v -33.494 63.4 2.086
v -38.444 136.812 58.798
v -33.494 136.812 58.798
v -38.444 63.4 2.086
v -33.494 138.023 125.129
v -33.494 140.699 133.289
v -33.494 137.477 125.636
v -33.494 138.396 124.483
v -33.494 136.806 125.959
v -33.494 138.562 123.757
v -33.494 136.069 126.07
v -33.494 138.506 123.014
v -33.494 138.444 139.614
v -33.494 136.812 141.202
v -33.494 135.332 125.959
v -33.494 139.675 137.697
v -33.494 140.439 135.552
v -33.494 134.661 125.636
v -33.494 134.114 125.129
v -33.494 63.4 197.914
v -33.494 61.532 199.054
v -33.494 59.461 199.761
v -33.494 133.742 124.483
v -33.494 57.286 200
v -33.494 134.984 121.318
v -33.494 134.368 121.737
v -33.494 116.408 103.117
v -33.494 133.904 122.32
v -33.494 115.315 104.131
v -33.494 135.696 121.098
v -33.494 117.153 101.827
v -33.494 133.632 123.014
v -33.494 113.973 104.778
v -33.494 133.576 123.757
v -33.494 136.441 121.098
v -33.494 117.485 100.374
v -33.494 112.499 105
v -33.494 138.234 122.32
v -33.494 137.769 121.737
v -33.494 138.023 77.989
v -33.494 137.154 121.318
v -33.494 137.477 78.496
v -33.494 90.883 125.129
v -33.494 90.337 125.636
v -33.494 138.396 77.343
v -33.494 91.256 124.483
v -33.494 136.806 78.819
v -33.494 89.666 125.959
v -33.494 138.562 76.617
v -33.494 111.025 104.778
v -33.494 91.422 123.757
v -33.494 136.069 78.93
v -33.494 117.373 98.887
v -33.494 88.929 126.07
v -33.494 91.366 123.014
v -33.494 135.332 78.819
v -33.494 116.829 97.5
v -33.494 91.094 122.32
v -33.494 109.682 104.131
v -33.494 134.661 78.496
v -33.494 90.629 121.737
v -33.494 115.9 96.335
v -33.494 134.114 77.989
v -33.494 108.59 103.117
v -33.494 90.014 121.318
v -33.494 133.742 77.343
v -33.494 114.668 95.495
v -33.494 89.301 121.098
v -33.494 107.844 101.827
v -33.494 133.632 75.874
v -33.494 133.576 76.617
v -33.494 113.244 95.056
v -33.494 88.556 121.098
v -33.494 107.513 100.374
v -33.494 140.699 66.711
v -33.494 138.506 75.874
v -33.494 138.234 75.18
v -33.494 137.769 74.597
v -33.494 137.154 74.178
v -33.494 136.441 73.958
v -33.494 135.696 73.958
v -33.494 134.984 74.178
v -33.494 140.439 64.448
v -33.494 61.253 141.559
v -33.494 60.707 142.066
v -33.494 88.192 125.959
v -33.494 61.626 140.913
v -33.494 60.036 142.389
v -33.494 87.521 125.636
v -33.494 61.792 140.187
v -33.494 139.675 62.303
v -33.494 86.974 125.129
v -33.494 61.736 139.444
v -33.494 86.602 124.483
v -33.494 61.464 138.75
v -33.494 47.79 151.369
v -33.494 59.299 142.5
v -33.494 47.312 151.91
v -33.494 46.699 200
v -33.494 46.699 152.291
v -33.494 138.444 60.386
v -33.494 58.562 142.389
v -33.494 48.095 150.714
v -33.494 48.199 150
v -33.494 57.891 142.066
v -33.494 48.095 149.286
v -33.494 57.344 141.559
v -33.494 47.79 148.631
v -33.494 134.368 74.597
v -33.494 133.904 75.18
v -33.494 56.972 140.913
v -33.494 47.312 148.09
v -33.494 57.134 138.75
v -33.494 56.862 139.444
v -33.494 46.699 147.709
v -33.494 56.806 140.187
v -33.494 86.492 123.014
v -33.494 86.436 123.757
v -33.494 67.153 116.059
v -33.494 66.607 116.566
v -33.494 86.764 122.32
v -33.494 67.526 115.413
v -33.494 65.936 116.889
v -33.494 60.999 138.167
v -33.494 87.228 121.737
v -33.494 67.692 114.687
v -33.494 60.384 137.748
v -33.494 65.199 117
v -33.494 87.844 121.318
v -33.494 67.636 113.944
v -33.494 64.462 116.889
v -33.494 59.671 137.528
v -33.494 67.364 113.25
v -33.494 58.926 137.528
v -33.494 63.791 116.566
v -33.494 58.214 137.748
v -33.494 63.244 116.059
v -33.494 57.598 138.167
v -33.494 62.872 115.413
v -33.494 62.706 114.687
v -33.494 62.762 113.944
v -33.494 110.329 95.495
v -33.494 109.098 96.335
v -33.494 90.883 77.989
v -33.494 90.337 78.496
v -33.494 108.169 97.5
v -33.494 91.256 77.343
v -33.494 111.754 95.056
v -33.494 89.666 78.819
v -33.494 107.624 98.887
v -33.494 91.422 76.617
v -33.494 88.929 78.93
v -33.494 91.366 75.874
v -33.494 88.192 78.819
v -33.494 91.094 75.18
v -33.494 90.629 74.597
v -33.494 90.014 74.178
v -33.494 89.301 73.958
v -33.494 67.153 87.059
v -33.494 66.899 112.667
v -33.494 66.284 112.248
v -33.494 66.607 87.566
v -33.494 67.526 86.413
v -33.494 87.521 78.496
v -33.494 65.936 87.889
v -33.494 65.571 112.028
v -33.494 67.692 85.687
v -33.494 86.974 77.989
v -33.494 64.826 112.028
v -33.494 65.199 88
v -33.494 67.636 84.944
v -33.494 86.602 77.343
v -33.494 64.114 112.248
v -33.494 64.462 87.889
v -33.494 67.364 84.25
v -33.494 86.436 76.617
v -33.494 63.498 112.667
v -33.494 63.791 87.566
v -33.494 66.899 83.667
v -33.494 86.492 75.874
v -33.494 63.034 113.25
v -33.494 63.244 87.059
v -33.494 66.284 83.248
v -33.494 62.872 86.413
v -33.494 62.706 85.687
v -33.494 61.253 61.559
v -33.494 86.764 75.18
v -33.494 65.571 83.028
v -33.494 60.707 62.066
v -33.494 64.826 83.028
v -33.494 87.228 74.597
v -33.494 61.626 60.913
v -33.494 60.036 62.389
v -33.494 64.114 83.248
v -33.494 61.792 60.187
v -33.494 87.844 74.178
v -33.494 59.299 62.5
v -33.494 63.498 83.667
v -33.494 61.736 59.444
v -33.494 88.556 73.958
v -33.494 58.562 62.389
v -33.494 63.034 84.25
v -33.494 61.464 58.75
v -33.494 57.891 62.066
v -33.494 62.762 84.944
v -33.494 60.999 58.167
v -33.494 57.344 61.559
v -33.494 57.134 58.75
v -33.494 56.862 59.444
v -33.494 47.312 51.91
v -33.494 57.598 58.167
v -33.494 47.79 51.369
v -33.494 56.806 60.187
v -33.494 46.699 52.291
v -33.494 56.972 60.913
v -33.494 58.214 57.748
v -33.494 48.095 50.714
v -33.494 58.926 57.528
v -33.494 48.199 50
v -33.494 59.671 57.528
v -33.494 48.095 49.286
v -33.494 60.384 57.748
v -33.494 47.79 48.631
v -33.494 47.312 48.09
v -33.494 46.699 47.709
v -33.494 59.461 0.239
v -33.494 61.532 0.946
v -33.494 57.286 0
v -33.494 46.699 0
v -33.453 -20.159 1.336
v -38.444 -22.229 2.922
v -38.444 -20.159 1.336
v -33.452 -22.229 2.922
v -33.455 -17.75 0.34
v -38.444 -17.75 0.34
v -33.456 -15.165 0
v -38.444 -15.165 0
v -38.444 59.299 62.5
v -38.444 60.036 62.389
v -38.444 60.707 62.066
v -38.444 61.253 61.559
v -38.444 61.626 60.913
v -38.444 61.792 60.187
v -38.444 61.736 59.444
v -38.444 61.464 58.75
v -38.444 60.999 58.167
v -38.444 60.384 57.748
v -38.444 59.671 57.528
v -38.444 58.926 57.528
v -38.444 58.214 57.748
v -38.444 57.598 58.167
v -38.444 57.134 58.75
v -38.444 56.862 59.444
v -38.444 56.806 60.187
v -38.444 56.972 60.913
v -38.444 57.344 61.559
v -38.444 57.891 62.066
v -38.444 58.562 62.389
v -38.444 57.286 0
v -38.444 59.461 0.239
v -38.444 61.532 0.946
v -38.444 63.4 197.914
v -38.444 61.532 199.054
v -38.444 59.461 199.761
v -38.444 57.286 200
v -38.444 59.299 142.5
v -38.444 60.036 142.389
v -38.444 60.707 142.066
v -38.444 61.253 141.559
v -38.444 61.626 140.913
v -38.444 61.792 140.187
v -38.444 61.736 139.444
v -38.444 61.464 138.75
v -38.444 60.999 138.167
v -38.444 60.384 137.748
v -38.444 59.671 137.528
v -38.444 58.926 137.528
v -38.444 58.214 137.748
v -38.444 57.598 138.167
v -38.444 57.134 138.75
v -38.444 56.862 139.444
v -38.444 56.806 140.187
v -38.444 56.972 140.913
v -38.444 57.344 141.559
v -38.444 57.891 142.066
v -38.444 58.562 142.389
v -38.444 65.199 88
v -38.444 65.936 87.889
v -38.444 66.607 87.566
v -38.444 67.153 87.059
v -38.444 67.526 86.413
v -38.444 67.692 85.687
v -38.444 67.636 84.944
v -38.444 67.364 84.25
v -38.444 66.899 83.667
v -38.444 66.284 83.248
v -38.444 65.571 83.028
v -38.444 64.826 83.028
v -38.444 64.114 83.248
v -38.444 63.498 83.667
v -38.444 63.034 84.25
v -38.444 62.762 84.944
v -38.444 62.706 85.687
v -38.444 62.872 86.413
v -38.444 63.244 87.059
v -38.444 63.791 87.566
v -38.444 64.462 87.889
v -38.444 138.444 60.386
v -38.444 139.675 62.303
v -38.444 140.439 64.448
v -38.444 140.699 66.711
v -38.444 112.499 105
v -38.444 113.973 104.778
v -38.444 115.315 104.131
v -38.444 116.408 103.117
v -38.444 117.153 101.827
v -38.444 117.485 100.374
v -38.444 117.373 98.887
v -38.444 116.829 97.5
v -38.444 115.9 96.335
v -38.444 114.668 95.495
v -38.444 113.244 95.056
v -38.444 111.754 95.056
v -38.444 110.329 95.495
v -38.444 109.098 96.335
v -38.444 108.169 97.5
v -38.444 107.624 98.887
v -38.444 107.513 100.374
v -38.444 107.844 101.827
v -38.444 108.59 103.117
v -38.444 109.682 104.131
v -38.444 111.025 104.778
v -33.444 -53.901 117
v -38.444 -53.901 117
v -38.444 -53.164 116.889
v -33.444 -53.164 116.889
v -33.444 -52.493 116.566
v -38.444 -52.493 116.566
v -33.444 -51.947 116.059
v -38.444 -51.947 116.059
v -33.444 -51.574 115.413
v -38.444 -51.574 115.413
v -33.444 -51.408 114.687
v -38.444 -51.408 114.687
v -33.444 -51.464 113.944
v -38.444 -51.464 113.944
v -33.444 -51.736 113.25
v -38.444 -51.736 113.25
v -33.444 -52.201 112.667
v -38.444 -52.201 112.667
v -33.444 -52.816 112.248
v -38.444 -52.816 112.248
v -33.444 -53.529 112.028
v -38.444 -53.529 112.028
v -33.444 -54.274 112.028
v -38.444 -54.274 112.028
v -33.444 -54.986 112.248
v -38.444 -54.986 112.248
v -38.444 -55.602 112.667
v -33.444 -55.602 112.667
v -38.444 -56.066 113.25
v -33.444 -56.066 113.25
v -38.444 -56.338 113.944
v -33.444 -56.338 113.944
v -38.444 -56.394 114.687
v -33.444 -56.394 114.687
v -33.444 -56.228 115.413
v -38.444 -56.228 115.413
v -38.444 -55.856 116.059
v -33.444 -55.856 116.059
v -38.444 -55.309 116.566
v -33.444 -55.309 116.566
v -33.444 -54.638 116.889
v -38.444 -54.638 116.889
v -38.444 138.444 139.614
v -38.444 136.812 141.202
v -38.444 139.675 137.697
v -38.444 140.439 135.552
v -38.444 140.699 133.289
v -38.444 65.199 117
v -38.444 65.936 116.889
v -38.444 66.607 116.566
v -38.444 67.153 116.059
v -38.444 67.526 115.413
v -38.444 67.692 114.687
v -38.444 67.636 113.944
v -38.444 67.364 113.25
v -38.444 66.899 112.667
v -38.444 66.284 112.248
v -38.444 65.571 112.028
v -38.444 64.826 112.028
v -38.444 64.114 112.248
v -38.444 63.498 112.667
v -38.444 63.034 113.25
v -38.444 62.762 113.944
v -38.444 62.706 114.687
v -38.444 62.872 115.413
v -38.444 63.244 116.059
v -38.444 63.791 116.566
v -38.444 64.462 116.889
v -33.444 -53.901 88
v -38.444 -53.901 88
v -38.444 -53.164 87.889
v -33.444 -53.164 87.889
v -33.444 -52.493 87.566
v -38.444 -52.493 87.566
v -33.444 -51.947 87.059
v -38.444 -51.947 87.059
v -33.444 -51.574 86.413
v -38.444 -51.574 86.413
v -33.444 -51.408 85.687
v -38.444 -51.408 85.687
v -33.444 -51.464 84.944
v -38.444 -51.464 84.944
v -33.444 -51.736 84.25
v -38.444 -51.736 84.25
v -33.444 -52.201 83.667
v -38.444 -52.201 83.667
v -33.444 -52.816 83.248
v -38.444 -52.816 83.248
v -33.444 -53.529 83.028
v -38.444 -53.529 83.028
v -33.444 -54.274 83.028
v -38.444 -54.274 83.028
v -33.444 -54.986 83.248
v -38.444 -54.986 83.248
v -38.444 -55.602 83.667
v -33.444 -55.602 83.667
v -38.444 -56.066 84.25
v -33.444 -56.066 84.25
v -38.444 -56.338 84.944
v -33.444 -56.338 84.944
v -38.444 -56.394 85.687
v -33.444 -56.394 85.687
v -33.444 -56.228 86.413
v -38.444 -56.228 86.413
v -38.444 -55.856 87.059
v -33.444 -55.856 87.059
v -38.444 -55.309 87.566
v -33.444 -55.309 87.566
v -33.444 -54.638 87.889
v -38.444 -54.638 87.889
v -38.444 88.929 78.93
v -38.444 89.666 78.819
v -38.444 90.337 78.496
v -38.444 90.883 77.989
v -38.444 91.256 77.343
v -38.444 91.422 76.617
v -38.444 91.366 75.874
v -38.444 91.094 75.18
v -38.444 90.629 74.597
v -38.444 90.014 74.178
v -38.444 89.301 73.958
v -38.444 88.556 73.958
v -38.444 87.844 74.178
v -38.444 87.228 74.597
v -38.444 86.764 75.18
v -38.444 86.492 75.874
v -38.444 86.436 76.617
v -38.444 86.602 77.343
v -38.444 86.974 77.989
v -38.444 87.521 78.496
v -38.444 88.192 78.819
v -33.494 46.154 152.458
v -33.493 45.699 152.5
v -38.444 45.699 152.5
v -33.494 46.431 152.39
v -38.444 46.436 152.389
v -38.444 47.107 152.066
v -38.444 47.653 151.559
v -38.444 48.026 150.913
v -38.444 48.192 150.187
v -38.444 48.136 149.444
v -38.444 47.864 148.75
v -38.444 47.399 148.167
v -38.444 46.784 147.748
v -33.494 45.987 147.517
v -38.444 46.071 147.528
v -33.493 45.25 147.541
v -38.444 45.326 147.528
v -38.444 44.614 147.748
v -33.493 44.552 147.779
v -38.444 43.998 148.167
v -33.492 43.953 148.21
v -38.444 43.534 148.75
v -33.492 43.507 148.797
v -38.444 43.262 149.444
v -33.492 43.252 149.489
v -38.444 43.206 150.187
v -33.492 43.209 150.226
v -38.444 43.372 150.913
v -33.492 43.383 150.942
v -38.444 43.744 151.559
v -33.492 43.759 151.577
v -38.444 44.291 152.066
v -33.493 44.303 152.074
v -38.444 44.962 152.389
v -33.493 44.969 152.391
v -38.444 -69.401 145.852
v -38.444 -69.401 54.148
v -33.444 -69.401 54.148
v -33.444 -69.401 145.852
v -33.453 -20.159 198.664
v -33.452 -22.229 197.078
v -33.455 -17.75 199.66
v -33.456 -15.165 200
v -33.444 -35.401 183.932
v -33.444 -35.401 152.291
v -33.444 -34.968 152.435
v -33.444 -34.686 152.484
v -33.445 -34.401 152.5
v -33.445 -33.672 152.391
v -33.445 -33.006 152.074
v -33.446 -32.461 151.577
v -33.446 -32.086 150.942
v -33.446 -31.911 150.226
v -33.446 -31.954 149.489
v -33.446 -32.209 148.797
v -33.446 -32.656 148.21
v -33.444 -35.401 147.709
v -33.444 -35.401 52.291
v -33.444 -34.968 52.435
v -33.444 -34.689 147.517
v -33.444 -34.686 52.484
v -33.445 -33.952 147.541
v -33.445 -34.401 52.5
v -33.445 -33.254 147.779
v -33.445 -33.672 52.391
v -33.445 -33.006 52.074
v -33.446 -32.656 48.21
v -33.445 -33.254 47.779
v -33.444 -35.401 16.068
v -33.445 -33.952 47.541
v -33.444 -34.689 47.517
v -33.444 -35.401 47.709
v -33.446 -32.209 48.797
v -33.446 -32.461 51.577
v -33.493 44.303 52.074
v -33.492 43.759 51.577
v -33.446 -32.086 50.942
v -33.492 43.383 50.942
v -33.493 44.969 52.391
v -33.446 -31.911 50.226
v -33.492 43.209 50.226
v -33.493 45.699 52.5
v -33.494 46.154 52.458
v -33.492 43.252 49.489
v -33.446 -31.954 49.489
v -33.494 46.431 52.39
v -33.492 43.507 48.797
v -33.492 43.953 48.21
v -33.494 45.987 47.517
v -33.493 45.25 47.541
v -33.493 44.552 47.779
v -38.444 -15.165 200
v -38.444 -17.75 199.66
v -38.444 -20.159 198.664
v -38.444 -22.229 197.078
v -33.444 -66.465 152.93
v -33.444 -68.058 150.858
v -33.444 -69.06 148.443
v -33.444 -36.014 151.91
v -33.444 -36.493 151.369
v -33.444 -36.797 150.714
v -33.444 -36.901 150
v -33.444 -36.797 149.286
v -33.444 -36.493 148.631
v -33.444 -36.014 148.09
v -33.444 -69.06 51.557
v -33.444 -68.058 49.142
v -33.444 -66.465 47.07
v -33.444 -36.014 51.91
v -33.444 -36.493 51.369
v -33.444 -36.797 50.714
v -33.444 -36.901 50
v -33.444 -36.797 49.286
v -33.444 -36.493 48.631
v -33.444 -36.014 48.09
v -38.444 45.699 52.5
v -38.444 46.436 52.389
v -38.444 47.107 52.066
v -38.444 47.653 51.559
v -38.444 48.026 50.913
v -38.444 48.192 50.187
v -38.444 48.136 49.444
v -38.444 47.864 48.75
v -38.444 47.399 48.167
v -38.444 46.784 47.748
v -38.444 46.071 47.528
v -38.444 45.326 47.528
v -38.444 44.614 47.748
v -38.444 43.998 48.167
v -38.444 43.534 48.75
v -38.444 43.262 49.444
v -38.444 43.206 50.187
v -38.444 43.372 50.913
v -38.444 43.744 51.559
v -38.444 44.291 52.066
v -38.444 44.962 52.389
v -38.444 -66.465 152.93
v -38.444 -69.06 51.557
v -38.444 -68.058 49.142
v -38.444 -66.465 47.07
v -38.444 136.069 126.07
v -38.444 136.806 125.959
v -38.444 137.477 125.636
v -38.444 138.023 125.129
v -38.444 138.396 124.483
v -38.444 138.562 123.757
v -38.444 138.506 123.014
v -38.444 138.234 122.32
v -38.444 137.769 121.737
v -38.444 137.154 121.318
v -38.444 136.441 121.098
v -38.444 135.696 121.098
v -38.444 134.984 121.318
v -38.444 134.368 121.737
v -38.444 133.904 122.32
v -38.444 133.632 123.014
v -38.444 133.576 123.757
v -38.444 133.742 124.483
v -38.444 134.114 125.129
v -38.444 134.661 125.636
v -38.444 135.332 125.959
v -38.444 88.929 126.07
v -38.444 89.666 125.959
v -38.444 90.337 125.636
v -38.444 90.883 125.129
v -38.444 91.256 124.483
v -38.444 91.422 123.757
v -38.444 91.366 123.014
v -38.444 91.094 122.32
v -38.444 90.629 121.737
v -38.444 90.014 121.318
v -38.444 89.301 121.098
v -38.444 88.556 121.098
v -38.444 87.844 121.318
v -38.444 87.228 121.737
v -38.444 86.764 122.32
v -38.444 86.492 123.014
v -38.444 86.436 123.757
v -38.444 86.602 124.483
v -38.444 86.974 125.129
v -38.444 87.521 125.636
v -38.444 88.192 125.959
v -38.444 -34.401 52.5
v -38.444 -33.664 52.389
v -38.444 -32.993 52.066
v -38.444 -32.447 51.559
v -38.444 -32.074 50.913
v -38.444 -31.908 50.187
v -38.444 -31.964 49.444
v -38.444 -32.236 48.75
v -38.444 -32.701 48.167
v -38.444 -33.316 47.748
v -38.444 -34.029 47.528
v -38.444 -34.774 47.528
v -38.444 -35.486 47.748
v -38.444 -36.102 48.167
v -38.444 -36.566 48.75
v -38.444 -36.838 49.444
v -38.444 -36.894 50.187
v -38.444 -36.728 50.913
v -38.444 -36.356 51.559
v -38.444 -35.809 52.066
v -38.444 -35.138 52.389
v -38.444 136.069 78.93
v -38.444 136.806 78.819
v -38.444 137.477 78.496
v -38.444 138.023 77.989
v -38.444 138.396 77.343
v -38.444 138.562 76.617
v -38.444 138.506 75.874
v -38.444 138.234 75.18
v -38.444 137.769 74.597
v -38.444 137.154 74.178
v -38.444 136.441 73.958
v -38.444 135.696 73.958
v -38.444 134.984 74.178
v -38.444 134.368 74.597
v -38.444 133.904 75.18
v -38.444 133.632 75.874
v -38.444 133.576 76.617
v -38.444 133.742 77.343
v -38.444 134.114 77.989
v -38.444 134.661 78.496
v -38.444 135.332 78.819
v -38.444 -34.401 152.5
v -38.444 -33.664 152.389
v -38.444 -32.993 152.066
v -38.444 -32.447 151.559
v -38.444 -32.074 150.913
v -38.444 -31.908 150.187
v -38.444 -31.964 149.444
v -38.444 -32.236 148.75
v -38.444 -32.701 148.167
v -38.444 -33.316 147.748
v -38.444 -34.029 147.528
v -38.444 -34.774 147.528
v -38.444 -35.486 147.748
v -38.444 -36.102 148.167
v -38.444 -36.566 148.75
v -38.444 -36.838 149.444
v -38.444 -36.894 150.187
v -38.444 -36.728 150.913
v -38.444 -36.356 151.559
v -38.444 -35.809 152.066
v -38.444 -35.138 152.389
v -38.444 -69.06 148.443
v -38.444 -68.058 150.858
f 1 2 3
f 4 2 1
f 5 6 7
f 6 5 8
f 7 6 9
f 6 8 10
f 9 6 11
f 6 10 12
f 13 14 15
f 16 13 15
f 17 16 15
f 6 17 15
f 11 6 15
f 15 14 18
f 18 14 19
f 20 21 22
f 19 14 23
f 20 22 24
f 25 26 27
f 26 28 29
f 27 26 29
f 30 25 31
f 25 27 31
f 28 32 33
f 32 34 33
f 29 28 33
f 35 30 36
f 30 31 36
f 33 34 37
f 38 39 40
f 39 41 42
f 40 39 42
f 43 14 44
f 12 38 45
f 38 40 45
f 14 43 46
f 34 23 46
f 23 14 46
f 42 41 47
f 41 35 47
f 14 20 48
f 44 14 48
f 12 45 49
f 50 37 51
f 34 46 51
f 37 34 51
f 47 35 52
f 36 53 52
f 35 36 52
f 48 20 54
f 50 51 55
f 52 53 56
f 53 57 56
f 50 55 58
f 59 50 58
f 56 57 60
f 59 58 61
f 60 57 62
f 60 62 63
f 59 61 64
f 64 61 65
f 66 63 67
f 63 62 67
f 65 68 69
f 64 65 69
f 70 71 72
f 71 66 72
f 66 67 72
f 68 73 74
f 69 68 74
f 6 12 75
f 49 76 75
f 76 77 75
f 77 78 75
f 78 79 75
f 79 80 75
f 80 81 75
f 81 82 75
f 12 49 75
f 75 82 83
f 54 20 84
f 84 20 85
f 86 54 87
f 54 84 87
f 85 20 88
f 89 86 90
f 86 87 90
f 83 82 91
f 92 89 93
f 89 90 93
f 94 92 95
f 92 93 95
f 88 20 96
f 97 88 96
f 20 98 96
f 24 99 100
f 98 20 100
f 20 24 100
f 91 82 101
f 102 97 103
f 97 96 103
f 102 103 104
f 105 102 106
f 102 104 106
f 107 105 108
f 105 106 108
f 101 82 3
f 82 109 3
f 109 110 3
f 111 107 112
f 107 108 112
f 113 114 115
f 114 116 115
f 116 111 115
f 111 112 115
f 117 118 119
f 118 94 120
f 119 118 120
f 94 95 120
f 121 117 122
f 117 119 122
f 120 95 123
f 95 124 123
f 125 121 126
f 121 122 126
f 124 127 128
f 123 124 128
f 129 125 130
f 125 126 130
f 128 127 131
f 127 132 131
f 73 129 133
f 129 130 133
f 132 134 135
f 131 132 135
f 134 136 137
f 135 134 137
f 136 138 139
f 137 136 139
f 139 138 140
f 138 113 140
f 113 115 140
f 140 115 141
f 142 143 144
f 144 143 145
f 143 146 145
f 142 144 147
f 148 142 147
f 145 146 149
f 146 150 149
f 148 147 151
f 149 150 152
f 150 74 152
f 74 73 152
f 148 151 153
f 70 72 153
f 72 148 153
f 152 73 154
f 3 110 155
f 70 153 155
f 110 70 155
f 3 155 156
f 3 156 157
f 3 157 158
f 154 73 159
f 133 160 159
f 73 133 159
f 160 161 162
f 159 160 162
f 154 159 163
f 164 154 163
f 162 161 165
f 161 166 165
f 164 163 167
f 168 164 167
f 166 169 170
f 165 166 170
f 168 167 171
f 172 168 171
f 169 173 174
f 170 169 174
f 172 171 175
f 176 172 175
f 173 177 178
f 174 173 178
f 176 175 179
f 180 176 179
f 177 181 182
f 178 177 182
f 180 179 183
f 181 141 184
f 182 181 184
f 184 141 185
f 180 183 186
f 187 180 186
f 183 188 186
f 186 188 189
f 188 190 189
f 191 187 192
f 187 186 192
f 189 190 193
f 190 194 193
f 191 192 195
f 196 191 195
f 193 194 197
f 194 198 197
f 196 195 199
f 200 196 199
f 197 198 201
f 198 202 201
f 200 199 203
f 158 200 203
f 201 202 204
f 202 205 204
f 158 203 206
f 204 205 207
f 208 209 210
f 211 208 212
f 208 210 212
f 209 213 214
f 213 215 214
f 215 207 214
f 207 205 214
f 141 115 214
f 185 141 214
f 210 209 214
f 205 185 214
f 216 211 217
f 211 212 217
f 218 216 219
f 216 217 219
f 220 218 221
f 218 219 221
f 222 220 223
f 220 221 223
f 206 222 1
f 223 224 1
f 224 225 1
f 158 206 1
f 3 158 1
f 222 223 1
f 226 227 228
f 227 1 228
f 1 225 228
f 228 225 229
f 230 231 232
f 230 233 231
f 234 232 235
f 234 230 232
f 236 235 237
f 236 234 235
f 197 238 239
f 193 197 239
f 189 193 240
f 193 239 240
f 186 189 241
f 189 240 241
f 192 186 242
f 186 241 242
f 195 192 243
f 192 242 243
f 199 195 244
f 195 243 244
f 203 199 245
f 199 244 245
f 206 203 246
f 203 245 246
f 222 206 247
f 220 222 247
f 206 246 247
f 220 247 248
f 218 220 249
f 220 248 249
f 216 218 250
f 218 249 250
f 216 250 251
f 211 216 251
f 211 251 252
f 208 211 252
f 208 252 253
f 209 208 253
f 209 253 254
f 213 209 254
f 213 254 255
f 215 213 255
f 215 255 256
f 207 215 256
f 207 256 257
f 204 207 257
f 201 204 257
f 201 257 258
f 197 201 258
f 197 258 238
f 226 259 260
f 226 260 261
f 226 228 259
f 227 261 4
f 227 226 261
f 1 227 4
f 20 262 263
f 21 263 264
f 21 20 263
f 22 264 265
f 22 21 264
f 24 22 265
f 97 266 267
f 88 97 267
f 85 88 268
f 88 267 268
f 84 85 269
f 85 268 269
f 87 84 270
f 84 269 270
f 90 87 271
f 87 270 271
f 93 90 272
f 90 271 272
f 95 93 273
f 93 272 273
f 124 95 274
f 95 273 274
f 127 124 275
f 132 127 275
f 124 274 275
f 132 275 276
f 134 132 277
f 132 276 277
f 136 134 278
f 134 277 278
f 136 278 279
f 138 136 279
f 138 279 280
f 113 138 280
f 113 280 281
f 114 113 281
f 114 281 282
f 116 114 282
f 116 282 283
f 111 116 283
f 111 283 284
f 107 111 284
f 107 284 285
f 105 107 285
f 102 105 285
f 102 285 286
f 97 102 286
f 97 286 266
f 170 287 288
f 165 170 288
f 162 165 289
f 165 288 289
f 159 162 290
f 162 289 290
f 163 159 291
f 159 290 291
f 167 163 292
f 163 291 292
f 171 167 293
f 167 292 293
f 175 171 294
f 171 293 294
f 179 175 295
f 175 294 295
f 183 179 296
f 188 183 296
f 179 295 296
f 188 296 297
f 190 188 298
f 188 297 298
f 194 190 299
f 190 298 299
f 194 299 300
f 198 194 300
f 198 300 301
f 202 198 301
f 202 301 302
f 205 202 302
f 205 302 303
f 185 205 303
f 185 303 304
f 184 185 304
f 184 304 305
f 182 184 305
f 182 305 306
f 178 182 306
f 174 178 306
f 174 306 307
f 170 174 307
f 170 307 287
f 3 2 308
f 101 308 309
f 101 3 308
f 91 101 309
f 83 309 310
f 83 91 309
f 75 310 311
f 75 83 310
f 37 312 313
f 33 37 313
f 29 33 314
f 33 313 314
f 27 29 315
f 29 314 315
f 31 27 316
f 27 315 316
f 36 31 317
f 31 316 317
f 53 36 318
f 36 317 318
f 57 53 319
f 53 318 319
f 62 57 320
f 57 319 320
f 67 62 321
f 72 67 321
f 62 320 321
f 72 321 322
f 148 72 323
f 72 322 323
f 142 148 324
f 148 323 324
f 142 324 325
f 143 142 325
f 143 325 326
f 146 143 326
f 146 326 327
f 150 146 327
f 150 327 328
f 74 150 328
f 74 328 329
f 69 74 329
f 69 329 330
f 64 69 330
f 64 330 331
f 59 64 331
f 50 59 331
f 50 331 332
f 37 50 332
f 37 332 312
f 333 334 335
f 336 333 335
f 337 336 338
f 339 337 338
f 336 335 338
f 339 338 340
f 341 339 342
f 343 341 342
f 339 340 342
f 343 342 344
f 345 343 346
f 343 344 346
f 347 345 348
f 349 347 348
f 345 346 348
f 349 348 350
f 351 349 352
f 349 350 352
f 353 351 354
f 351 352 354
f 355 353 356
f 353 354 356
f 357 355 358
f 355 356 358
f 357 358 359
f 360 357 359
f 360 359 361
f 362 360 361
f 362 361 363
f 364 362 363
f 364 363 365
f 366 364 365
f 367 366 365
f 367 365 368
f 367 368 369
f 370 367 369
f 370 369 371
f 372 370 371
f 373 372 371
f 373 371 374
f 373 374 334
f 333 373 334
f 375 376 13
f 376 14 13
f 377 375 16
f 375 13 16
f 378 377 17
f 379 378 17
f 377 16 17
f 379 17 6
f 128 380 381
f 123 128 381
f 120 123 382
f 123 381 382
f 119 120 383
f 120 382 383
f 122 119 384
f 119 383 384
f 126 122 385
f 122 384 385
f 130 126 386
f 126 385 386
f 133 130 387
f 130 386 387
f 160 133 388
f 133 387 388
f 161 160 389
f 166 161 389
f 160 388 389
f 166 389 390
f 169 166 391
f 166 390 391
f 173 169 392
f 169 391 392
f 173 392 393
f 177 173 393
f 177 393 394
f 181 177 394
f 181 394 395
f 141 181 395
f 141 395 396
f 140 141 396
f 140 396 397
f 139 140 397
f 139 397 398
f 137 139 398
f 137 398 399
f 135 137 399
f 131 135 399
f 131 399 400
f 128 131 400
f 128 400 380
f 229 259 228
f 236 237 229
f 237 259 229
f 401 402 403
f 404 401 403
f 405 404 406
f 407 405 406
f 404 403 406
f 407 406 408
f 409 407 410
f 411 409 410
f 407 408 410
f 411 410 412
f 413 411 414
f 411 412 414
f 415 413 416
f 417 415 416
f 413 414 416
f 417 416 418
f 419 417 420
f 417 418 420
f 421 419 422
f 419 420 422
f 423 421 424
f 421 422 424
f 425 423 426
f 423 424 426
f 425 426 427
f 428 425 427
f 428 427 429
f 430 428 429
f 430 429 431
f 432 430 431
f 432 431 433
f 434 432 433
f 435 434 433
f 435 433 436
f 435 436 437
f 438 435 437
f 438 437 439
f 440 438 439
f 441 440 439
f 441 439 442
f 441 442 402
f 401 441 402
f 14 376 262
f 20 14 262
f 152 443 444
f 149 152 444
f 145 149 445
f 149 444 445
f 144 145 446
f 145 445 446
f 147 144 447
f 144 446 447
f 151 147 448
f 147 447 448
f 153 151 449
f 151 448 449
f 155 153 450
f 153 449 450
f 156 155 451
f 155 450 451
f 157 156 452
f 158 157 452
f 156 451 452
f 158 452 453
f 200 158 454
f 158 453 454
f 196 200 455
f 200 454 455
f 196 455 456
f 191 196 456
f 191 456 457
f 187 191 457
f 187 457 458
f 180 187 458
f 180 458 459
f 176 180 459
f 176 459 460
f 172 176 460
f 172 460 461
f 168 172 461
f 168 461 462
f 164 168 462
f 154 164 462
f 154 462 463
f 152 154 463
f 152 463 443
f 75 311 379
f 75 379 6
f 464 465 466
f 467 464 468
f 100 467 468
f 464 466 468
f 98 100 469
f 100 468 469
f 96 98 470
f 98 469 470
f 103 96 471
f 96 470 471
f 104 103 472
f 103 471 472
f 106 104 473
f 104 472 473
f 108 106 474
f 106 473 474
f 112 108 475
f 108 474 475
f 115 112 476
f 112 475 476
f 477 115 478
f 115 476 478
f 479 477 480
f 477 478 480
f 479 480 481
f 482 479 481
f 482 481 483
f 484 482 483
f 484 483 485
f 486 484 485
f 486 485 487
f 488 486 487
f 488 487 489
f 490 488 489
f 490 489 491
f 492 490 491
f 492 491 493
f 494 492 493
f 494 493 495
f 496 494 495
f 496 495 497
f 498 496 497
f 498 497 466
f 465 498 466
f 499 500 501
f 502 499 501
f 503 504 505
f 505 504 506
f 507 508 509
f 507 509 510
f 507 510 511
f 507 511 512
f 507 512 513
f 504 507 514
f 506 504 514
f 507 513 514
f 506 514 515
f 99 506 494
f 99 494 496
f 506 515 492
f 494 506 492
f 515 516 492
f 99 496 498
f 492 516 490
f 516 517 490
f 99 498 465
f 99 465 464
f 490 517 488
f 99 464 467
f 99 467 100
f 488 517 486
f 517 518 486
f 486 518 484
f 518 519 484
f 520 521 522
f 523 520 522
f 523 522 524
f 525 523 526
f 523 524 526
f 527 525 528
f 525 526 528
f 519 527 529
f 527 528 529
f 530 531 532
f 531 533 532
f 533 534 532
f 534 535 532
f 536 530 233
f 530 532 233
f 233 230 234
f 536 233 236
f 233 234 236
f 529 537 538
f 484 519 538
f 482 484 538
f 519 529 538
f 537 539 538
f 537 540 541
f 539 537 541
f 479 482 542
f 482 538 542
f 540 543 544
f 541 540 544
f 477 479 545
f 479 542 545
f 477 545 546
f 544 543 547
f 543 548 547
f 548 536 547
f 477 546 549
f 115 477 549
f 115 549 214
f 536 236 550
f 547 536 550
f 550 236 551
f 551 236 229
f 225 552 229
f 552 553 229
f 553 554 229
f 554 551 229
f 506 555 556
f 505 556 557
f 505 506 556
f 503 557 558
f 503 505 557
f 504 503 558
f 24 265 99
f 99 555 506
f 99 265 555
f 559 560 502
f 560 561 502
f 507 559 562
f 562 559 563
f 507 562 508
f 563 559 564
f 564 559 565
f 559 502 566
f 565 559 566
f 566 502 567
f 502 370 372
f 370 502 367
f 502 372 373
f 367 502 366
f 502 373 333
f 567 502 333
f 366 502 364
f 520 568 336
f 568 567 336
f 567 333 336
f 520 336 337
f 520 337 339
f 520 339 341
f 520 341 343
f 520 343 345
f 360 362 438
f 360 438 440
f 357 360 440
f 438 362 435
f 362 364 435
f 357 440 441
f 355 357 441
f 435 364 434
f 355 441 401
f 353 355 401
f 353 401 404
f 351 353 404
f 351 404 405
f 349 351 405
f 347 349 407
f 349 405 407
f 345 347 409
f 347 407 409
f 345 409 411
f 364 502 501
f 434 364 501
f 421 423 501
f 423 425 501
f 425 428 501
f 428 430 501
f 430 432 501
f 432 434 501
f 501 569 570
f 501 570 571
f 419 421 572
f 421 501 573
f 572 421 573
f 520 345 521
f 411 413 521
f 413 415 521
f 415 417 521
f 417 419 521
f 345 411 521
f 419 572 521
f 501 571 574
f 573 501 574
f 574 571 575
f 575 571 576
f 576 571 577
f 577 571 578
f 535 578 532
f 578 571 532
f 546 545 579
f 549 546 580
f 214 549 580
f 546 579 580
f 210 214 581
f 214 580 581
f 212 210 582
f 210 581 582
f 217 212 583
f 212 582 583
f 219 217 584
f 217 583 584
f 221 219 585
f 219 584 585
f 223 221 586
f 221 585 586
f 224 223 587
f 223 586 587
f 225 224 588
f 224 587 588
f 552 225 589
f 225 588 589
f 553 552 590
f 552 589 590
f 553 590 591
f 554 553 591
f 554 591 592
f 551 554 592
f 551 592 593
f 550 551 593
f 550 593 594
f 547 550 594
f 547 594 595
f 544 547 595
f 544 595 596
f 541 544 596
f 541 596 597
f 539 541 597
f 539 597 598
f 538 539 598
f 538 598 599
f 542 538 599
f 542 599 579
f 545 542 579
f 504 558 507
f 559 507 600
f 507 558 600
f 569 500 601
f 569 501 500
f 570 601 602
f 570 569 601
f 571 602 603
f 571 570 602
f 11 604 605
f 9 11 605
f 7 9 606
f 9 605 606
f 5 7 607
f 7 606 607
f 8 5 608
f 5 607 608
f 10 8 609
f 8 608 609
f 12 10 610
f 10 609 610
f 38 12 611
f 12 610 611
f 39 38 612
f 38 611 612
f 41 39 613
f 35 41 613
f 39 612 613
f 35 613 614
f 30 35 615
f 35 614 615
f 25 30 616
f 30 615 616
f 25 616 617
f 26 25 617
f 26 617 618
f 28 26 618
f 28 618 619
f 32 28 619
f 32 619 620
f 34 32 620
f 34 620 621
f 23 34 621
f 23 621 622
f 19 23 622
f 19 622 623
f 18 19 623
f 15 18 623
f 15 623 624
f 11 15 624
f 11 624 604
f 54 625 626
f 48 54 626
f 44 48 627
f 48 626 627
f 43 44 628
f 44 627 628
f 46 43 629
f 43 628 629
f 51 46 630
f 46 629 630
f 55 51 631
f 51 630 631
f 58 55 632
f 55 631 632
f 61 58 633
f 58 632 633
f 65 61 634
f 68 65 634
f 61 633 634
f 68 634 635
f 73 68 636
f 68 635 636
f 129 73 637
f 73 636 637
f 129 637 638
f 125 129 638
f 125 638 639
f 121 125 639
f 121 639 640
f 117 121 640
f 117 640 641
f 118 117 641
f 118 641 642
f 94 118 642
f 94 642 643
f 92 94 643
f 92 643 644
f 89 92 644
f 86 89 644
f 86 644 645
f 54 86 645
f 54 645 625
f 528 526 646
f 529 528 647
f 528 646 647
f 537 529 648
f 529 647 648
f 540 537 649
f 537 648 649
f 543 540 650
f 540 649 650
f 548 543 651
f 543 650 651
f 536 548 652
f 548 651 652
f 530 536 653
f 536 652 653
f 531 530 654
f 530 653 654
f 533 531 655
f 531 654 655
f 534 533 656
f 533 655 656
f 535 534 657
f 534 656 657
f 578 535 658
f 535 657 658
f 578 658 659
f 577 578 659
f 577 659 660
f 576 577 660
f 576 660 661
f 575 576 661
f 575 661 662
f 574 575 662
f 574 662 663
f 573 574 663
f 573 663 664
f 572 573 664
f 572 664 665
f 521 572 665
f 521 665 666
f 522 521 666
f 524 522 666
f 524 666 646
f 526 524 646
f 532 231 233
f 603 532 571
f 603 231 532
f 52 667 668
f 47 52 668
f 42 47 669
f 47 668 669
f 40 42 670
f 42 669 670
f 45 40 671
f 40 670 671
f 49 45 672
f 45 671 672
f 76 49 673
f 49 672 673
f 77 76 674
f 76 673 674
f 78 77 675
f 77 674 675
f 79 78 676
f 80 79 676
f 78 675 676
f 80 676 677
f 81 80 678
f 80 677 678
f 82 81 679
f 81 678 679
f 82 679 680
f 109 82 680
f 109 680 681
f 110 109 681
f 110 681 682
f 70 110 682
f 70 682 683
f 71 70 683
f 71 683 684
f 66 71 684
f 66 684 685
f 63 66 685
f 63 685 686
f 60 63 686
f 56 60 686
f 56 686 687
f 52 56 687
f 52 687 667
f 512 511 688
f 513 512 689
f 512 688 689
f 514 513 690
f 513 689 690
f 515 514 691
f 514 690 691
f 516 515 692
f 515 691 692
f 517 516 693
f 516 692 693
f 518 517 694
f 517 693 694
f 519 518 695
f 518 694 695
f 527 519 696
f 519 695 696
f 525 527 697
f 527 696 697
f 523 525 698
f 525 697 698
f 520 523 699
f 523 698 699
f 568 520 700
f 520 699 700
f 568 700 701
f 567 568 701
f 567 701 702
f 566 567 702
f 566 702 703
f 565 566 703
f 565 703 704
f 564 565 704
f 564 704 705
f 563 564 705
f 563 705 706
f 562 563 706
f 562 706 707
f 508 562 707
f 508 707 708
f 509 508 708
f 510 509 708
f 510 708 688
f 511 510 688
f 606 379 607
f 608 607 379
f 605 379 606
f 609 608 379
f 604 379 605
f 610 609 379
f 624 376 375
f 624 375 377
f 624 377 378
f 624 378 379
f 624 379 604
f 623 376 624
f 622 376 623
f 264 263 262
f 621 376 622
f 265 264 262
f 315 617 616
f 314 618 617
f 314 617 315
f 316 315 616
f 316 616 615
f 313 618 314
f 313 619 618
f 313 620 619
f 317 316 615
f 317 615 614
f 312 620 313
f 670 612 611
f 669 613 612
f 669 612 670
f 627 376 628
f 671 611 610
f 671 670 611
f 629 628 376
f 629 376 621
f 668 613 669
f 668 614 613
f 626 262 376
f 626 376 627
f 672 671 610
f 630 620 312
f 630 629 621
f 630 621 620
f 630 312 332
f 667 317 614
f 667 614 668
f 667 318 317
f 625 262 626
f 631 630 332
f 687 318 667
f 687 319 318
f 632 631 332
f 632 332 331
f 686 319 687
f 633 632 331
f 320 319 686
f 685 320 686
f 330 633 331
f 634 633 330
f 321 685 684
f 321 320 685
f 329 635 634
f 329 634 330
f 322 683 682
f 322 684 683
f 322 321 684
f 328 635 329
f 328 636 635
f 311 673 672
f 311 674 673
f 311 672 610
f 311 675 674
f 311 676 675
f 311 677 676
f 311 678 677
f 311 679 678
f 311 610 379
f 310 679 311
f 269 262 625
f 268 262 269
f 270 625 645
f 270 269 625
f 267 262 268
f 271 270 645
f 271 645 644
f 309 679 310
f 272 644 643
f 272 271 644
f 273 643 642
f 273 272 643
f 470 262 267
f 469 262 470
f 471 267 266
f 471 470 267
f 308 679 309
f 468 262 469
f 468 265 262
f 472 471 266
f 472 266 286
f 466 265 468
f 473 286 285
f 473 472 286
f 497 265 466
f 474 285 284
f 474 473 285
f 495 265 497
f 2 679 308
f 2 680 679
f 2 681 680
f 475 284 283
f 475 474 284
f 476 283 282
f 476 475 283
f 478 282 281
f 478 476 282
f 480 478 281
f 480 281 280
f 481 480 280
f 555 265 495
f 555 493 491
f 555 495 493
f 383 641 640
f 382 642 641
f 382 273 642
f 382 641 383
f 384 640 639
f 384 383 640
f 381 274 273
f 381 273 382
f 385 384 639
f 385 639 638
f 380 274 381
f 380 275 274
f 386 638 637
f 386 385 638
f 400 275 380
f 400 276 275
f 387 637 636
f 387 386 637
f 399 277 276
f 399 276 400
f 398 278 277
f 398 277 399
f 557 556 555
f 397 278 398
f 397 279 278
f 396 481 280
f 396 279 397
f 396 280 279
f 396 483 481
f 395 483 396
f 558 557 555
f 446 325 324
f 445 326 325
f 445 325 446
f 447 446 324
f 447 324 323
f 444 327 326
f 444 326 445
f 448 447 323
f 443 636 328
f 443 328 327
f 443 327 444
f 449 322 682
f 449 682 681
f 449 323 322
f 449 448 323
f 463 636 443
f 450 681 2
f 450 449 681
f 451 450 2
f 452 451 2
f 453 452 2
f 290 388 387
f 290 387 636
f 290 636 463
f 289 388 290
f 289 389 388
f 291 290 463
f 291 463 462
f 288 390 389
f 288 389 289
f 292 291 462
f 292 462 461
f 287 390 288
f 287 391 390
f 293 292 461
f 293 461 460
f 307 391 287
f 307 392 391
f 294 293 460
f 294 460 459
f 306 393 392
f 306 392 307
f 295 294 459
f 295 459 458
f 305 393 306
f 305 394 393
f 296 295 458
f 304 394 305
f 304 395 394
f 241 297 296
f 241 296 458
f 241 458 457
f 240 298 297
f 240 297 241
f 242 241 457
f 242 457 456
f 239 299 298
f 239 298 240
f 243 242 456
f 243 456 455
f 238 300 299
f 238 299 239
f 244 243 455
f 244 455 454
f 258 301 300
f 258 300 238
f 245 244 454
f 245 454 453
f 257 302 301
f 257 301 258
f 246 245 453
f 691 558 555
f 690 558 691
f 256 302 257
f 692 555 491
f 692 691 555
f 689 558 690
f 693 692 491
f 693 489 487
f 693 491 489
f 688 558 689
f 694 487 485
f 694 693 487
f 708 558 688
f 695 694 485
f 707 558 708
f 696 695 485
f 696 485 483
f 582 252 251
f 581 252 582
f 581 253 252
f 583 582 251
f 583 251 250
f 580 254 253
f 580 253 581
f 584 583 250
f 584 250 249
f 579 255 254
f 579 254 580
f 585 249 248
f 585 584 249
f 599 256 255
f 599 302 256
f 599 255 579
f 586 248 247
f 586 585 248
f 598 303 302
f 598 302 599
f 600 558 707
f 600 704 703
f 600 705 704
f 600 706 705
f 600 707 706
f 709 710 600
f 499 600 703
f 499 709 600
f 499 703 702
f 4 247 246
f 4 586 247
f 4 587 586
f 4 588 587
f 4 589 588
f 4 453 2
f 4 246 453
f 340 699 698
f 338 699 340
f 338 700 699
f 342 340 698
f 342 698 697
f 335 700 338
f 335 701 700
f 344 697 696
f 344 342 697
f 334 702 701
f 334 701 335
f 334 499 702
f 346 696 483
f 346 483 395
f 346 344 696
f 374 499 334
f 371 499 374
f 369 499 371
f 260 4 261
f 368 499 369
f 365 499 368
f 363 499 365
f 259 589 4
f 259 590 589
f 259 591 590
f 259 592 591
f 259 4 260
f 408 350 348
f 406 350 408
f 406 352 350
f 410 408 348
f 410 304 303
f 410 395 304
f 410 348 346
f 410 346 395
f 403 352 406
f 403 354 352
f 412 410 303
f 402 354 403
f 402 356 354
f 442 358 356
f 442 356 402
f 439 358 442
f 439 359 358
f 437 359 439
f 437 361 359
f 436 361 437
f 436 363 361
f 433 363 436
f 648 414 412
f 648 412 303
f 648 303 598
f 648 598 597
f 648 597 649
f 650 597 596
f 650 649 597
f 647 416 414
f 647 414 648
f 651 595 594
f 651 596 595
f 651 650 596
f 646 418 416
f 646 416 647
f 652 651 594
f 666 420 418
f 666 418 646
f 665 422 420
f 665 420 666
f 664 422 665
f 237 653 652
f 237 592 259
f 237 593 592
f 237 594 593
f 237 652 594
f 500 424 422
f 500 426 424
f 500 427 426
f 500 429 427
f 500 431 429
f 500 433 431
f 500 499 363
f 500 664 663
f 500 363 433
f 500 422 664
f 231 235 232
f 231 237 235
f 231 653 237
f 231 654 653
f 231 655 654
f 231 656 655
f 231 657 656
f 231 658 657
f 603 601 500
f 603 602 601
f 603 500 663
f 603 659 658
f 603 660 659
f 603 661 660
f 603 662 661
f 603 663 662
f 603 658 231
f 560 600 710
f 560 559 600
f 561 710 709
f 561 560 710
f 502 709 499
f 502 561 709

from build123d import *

# Parameters (mm, degrees)
SALIENTE_EXTRUIR1_DEPTH = 200
CROQUIS2_R              = 2.5
CORTAR_EXTRUIR1_DEPTH   = 100
CROQUIS3_W              = 4.95
CROQUIS3_H              = 200
SALIENTE_EXTRUIR2_DEPTH = 60
CROQUIS4_R              = 2.5
CROQUIS4_R_2            = 5
CORTAR_EXTRUIR2_DEPTH   = 60
REDONDEO1_R             = 10


with BuildPart() as part:
    # Croquis1 → Saliente-Extruir1 (new body)
    with BuildSketch(Plane.XY):
        Polygon((-38.444023, 46.698845), (-38.444023, -35.401155), (-38.444023, -69.401155), (-33.444023, -69.401155), (-33.444023, -35.401155), (-33.494023, 46.698845), (-33.494023, 80.698845), (-38.444023, 80.698845), align=None)
    extrude(amount=SALIENTE_EXTRUIR1_DEPTH)

    # Croquis2 → Cortar-Extruir1 (cut)
    with BuildSketch(Plane.ZY.offset(38.444023)):
        with Locations((85.5, 65.198845)):
            Circle(CROQUIS2_R)
        with Locations((114.5, 65.198845)):
            Circle(CROQUIS2_R)
        with Locations((50, 45.698845)):
            Circle(CROQUIS2_R)
        with Locations((150, 45.698845)):
            Circle(CROQUIS2_R)
        with Locations((150, -34.401155)):
            Circle(CROQUIS2_R)
        with Locations((114.5, -53.901155)):
            Circle(CROQUIS2_R)
        with Locations((85.5, -53.901155)):
            Circle(CROQUIS2_R)
        with Locations((50, -34.401155)):
            Circle(CROQUIS2_R)
    extrude(amount=-CORTAR_EXTRUIR1_DEPTH, mode=Mode.SUBTRACT)

    # Croquis3 → Saliente-Extruir2 (add)
    with BuildSketch(Plane(origin=(0, 80.698845, 0), x_dir=(1, 0, 0), z_dir=(0, 1, 0))):
        with Locations((-35.969023, -100)):
            Rectangle(CROQUIS3_W, CROQUIS3_H)
    extrude(amount=SALIENTE_EXTRUIR2_DEPTH)

    # Croquis4 → Cortar-Extruir2 (cut)
    with BuildSketch(Plane.ZY.offset(38.444023)):
        with Locations((76.43, 136.068845)):
            Circle(CROQUIS4_R)
        with Locations((123.57, 136.068845)):
            Circle(CROQUIS4_R)
        with Locations((76.43, 88.928845)):
            Circle(CROQUIS4_R)
        with Locations((123.57, 88.928845)):
            Circle(CROQUIS4_R)
        with Locations((100, 112.498845)):
            Circle(CROQUIS4_R_2)
        with Locations((60, 59.298845)):
            Circle(CROQUIS4_R)
        with Locations((140, 59.298845)):
            Circle(CROQUIS4_R)
        Polygon((61.8, 140.698845), (0, 60.698845), (0, 140.698845), align=None)
        Polygon((0, -19.301155), (50, -69.401155), (0, -69.401155), align=None)
        Polygon((200, -19.301155), (150, -69.401155), (200, -69.401155), align=None)
        Polygon((138.2, 140.698845), (200, 60.698845), (200, 140.698845), align=None)
    extrude(amount=-CORTAR_EXTRUIR2_DEPTH, mode=Mode.SUBTRACT)

    # Redondeo1
    redondeo1_edges = [part.edges().sort_by_distance(p)[0] for p in [
        (-35.969023, 60.698845, 0),
        (-35.944023, -69.401155, 50),
        (-35.944023, -69.401155, 150),
        (-35.969023, 60.698845, 200),
        (-35.969023, 140.698845, 138.2),
        (-35.969023, 140.698845, 61.8),
        (-35.948925, -19.301155, 0),
        (-35.948925, -19.301155, 200),
    ]]
    fillet(redondeo1_edges, radius=REDONDEO1_R)


solid = part.part
